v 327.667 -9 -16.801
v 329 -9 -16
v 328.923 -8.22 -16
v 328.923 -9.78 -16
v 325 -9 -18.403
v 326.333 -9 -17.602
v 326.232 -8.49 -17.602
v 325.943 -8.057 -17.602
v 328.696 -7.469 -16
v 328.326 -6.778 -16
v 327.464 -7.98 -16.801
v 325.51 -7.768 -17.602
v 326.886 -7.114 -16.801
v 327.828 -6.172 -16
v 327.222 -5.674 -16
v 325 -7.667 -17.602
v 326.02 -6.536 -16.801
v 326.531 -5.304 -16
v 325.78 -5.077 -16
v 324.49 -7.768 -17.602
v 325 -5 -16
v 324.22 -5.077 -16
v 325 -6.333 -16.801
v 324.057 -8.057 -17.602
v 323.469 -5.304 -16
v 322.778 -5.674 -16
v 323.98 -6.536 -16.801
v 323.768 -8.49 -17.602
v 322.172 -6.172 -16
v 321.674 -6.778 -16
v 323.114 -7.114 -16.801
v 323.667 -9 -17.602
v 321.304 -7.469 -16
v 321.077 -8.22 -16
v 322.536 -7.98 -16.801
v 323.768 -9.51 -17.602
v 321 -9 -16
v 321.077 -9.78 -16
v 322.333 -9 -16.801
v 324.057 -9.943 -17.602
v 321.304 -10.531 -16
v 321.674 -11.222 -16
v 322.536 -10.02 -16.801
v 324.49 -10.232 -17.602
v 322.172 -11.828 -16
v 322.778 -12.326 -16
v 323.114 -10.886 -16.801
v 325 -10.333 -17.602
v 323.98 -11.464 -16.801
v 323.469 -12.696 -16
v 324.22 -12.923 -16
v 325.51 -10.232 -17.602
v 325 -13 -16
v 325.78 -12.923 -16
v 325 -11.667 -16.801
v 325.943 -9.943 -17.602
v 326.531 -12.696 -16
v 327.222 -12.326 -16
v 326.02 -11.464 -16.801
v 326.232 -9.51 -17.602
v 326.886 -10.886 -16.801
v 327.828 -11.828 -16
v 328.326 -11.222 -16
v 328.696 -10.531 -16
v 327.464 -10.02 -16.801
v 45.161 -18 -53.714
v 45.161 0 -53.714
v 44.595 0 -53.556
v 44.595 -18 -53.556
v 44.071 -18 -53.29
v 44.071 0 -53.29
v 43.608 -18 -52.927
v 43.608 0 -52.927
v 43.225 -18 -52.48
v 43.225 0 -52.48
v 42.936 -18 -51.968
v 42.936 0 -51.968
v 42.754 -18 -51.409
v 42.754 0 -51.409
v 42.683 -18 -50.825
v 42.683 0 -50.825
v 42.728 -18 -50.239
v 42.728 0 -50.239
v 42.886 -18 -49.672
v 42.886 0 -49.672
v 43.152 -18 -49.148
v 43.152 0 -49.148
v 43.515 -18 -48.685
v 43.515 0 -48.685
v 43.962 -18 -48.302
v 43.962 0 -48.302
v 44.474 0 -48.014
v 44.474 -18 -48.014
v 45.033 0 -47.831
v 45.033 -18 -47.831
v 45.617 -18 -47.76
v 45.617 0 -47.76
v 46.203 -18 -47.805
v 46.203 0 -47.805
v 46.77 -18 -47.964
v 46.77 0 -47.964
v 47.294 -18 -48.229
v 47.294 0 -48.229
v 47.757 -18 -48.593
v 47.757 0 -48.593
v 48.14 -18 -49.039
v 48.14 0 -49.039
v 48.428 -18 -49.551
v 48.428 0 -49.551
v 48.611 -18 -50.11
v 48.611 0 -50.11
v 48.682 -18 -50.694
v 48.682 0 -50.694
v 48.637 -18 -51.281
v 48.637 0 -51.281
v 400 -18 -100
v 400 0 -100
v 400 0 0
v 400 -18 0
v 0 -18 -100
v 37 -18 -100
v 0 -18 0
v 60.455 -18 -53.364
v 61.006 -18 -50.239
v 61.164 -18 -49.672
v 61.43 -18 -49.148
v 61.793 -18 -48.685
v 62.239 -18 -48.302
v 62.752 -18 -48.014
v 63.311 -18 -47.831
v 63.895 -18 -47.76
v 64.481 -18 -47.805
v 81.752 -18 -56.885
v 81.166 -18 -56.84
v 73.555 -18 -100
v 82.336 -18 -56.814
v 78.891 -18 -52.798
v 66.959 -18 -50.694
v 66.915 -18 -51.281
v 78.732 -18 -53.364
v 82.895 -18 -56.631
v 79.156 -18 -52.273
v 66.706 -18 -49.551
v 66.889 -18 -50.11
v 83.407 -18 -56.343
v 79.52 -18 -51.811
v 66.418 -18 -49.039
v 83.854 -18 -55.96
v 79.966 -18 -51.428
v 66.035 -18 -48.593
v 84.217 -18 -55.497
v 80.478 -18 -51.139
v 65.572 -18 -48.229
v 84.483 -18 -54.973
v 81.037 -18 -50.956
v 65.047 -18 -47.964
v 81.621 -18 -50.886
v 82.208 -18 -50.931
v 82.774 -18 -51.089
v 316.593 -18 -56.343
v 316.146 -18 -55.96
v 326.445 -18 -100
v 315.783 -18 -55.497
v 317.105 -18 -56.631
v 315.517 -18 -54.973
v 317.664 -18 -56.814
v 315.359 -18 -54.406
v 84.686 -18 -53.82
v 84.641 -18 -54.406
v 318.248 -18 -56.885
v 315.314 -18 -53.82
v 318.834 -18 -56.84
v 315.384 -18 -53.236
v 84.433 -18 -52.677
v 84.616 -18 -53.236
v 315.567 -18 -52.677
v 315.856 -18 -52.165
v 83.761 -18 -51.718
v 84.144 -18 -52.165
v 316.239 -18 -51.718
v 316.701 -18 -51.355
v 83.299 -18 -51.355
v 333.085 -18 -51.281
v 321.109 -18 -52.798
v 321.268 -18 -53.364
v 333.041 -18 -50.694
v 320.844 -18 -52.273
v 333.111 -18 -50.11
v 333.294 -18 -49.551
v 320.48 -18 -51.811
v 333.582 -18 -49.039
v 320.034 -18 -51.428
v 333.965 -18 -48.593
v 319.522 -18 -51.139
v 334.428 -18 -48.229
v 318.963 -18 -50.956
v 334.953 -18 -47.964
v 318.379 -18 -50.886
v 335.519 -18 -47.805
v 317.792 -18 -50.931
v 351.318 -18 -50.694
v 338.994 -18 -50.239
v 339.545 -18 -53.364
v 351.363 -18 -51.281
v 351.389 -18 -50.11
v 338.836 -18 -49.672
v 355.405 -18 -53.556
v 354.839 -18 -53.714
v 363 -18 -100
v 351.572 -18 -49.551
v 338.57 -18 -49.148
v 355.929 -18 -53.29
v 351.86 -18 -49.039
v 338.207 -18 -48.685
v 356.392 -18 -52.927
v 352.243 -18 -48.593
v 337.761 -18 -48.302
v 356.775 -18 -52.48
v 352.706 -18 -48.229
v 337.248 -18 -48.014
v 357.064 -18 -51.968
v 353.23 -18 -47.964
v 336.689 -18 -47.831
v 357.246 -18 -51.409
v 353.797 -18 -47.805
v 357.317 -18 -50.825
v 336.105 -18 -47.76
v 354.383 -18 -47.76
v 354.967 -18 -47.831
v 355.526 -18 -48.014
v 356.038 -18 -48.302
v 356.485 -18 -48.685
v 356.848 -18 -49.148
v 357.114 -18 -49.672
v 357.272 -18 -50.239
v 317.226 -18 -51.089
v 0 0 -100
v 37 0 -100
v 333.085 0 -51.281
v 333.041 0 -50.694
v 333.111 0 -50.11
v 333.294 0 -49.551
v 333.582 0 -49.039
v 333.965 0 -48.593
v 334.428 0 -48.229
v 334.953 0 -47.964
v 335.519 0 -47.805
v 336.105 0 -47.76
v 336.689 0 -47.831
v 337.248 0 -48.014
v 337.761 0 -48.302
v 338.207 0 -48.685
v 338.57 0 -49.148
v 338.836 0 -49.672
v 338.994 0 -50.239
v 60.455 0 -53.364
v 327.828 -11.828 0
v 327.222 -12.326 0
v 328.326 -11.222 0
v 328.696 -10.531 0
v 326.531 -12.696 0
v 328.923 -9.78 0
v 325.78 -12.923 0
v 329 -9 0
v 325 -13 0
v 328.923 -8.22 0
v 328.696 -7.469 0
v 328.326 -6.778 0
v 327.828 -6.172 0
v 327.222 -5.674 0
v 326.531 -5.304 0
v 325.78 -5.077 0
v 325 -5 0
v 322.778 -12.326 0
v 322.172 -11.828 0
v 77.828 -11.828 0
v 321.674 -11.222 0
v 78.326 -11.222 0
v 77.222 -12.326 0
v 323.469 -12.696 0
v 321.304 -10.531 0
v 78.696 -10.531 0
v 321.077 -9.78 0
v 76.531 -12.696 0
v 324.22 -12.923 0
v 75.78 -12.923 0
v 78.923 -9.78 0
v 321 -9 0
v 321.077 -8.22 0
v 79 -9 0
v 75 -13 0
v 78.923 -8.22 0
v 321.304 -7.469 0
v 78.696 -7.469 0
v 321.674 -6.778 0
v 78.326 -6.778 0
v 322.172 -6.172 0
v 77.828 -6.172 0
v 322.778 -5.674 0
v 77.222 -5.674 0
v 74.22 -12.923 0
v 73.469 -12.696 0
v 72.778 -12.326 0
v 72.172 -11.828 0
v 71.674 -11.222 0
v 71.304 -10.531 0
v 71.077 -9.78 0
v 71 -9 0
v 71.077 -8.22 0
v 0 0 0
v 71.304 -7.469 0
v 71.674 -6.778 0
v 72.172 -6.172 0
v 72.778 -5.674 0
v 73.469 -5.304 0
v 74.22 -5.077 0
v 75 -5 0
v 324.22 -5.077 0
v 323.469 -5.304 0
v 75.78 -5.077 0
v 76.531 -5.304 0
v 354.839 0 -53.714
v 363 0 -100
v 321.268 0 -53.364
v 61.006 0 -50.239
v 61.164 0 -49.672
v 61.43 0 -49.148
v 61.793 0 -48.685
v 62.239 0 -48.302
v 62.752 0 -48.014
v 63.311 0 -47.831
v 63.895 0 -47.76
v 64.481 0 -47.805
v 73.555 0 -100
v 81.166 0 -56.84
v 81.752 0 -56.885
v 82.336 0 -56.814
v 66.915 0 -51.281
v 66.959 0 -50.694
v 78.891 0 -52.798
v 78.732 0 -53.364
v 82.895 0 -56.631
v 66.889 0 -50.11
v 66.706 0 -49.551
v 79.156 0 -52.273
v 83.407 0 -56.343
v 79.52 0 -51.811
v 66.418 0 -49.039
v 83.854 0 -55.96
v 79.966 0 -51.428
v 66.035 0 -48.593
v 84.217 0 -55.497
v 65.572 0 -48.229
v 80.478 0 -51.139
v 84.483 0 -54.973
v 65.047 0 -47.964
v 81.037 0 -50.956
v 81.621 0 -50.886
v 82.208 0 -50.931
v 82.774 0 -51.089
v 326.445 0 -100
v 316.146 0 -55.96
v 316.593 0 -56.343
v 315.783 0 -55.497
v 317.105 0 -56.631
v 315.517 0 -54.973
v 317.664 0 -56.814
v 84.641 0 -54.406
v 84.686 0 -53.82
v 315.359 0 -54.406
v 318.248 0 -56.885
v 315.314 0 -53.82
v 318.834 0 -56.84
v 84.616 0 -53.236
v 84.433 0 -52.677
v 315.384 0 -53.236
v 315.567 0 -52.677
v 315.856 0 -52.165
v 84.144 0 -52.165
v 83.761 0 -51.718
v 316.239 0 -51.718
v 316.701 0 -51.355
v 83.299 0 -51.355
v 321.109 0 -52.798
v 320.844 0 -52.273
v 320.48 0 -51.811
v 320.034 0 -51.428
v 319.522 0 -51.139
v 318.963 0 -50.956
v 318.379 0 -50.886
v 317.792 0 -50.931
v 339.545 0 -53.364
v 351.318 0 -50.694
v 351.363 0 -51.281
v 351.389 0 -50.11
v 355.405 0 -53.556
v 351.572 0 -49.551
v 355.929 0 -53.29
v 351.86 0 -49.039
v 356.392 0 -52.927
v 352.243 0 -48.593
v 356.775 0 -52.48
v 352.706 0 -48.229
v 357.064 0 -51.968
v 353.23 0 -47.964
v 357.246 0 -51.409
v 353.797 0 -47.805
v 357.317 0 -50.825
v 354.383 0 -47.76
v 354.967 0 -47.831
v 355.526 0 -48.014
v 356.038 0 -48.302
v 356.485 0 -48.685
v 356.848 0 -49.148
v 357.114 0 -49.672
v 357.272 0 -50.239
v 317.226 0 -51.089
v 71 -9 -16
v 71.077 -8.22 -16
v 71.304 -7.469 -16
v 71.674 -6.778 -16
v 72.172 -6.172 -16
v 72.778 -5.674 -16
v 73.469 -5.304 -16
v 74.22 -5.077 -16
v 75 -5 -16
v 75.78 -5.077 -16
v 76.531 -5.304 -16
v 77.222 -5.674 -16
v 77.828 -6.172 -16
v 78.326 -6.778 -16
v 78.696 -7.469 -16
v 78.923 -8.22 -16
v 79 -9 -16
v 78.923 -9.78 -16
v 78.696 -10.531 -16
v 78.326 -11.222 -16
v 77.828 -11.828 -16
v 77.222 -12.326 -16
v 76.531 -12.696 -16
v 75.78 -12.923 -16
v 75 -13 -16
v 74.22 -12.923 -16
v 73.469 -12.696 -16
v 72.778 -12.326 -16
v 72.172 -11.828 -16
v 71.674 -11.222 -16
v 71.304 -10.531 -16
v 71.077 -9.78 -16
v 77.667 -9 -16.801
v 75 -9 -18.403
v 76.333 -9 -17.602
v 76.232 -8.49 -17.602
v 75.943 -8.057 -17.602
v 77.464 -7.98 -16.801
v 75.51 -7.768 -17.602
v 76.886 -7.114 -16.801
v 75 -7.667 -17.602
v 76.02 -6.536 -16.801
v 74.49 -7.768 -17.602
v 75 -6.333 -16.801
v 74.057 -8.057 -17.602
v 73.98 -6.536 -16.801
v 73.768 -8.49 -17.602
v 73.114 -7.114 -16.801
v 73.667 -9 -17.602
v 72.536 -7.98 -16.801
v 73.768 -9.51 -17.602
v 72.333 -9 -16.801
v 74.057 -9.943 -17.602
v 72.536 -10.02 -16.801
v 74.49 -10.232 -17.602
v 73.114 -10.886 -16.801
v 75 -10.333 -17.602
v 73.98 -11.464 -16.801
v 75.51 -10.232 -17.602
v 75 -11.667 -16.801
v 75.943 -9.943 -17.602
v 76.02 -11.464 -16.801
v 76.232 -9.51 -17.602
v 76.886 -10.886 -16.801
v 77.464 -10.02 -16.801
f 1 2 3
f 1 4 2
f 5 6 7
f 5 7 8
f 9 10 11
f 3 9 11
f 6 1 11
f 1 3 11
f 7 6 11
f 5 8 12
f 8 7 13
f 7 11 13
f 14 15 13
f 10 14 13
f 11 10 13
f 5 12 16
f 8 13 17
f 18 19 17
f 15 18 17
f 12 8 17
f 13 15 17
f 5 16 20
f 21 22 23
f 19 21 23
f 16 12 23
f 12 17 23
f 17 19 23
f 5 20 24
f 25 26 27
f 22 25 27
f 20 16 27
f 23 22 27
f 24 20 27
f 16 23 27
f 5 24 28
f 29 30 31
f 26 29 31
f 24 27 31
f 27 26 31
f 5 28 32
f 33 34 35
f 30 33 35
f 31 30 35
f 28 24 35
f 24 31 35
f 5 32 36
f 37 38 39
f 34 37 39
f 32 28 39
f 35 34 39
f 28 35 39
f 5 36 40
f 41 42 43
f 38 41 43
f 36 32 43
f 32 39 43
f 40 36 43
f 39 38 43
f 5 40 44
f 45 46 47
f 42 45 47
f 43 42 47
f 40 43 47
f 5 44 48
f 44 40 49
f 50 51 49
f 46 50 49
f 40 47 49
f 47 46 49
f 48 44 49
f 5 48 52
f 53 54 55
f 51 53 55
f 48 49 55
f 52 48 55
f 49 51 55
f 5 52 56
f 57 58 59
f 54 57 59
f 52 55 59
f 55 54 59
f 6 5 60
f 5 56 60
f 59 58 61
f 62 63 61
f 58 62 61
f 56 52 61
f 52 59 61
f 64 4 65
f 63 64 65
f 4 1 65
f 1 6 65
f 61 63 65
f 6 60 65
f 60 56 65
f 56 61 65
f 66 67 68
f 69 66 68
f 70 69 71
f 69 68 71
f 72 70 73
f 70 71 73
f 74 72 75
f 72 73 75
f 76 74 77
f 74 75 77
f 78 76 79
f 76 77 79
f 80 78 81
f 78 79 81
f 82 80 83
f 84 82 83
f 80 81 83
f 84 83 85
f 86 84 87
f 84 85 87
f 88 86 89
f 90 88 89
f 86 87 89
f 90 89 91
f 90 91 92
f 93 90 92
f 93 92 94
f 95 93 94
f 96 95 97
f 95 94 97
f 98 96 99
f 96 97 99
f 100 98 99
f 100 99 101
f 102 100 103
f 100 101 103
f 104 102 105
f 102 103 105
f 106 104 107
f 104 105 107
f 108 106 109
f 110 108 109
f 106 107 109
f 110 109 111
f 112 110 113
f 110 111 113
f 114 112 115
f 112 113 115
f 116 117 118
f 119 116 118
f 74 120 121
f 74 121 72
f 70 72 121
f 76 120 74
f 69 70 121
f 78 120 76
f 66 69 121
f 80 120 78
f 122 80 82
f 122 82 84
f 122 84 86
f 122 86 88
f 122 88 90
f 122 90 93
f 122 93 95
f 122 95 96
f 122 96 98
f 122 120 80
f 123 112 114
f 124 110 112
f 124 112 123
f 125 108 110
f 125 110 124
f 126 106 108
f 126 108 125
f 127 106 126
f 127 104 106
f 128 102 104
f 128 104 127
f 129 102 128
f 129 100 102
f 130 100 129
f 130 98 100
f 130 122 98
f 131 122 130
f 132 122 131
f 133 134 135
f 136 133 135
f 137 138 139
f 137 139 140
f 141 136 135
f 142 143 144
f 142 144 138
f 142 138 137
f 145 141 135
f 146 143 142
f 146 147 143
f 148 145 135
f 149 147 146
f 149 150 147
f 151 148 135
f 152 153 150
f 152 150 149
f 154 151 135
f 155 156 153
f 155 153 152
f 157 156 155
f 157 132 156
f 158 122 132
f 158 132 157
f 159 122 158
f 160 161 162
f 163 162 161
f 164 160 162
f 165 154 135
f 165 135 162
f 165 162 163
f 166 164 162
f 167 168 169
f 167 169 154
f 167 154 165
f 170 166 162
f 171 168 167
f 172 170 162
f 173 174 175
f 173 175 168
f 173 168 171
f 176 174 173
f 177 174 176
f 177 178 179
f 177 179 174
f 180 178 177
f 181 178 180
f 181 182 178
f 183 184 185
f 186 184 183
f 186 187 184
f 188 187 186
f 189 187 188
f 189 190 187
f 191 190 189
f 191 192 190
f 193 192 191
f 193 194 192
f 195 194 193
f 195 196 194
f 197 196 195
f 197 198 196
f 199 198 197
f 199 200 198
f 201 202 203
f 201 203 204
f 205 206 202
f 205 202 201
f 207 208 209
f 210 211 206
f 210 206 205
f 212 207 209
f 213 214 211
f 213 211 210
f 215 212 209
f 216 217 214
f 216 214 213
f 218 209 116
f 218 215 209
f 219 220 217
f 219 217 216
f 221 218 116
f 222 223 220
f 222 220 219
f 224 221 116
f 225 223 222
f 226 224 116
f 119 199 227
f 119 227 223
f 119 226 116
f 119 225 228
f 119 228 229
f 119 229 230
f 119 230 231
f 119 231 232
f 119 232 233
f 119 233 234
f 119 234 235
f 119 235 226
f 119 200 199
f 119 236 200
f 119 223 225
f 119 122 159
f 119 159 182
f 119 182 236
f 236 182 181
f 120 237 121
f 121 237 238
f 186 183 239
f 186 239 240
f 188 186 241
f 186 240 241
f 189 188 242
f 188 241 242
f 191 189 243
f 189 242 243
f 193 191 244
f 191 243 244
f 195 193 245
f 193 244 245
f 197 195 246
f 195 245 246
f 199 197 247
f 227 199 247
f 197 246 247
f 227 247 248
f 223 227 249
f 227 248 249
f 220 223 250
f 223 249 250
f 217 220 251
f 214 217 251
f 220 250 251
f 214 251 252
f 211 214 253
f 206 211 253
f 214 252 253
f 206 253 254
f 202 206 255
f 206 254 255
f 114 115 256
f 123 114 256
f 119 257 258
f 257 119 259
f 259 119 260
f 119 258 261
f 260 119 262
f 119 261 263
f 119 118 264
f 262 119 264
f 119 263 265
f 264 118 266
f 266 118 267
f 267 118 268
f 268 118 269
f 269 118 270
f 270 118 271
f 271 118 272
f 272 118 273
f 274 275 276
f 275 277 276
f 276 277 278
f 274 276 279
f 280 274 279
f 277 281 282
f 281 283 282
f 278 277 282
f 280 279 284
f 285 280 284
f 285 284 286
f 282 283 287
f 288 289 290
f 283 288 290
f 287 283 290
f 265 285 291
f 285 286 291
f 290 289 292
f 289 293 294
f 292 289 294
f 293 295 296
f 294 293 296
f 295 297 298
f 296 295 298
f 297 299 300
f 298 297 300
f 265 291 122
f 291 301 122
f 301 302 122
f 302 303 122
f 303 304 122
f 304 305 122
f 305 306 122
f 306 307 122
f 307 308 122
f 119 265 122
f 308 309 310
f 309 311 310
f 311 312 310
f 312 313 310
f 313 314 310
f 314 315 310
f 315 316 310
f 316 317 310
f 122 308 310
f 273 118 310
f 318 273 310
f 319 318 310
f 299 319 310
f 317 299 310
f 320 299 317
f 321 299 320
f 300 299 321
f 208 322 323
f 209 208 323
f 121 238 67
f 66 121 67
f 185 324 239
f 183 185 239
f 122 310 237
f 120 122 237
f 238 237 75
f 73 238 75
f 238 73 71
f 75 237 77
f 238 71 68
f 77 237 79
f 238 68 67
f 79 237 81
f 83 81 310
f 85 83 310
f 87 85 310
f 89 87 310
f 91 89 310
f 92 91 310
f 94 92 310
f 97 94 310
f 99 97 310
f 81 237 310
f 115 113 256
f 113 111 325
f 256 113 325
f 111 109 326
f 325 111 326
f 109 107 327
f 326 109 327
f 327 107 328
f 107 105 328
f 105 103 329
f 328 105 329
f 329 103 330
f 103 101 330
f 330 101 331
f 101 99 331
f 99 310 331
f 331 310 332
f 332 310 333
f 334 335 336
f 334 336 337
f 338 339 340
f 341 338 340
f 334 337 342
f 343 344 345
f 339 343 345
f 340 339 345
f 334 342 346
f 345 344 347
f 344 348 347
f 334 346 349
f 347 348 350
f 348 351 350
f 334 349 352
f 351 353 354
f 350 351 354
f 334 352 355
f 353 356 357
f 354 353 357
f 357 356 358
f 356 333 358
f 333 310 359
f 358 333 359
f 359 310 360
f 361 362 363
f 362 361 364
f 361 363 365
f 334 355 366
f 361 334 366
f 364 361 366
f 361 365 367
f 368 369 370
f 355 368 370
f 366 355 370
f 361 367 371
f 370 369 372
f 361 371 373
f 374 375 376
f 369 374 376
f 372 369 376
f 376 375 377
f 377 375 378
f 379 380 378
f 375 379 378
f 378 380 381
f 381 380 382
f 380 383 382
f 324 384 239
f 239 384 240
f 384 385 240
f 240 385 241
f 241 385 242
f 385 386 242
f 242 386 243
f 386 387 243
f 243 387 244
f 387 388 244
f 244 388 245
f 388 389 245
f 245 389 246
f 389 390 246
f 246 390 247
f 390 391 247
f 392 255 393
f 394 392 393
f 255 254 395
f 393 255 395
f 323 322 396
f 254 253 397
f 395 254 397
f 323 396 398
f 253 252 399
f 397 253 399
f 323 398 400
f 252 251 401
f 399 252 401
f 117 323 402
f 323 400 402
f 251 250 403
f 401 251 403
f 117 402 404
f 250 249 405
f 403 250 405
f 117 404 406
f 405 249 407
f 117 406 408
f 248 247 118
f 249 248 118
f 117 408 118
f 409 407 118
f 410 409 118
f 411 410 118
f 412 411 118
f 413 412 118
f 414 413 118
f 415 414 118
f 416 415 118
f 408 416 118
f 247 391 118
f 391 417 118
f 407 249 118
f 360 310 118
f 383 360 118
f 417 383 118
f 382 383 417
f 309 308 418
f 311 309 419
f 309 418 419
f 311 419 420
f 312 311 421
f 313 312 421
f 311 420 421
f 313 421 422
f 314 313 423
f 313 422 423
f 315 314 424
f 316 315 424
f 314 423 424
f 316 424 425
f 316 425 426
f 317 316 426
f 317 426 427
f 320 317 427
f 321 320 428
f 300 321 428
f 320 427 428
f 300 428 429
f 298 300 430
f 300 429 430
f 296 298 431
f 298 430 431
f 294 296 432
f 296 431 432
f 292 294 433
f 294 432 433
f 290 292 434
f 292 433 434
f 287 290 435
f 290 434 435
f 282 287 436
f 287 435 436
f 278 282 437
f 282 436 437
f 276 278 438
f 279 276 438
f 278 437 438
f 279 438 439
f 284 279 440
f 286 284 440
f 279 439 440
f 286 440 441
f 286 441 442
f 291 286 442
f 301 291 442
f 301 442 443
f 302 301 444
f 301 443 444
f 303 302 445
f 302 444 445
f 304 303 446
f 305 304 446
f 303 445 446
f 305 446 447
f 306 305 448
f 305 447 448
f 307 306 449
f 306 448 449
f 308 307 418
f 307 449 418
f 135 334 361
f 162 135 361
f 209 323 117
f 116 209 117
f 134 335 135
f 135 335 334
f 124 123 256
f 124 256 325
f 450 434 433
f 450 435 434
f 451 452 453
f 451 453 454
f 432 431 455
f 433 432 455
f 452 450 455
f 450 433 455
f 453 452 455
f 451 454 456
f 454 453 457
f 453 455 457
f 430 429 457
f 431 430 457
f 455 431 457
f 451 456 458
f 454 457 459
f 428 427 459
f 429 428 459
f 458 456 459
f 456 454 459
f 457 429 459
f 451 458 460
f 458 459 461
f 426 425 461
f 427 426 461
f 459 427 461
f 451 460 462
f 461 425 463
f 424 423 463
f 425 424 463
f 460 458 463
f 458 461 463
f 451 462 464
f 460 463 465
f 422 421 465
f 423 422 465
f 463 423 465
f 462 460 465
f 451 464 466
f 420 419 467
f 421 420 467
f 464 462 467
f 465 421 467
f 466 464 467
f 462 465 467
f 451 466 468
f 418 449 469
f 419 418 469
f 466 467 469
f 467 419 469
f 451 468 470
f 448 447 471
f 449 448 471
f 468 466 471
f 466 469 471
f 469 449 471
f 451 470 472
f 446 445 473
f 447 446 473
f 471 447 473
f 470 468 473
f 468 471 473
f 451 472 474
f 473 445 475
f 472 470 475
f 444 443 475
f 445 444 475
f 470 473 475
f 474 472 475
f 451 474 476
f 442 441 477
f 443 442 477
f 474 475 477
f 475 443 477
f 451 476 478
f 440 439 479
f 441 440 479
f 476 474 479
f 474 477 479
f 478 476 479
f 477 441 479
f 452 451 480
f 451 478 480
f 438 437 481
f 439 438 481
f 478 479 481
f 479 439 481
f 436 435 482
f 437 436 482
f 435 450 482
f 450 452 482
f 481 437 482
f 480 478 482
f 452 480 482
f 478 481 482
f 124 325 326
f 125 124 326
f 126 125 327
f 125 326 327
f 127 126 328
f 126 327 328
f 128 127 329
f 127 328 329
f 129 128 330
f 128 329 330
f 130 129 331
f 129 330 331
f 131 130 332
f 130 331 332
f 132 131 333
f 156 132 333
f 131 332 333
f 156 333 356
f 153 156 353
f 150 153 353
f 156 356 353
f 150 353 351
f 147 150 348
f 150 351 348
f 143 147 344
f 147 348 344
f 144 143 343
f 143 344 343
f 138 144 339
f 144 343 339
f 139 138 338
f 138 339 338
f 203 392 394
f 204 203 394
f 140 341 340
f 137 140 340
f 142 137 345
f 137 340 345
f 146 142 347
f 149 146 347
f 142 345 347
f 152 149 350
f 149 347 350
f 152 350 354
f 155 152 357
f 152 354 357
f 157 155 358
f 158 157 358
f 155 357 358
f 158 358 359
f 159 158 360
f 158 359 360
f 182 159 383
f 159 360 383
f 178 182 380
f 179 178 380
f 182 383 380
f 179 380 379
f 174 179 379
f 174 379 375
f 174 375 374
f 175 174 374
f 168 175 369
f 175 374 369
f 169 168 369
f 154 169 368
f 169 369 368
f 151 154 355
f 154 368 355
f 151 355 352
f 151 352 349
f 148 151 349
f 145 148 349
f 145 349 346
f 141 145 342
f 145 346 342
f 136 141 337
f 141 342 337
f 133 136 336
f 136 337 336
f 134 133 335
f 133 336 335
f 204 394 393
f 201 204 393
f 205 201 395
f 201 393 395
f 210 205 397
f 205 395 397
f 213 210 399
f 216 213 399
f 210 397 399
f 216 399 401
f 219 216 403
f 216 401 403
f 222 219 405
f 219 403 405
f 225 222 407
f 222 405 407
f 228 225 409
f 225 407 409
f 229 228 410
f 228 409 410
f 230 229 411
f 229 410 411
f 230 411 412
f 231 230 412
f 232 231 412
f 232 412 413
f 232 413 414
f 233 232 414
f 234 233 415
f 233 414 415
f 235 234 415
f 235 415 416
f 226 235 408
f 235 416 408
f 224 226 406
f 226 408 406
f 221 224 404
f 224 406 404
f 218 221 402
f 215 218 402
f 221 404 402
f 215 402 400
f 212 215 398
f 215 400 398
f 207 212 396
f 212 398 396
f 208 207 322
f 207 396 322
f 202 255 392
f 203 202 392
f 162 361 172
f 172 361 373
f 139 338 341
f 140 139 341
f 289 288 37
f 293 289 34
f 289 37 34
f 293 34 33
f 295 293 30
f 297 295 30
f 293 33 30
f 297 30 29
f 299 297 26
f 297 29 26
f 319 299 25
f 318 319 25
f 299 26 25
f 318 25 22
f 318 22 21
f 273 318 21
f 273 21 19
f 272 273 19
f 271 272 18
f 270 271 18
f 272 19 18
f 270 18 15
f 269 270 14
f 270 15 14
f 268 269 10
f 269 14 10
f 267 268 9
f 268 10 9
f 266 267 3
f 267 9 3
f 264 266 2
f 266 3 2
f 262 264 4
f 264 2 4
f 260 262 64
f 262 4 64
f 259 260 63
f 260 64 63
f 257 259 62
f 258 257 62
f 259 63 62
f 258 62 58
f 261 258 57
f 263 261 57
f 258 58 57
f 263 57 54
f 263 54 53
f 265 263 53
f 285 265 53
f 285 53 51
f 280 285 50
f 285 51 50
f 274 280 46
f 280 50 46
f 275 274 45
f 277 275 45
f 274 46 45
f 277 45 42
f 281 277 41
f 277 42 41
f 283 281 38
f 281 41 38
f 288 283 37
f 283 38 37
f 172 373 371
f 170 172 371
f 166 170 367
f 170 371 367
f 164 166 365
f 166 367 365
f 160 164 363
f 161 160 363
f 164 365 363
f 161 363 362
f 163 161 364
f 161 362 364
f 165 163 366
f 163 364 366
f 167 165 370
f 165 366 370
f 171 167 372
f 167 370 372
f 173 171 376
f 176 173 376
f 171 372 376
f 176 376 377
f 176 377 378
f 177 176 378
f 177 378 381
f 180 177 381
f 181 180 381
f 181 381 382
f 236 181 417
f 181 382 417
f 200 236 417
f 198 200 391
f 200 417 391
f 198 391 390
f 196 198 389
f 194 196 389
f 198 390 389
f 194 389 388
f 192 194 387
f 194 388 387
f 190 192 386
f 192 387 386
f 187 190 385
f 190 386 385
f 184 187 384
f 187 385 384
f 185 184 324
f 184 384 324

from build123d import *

# Parameters (mm, degrees)
F1_DEPTH = 18
F3_D     = 8
F3_DEPTH = 16
F3_TIP   = 2.4034424761


with BuildPart() as f1:
    # F0 (on Front) → F1 (new body)
    with BuildSketch(Plane.XZ):
        with BuildLine():
            Line((400, 0), (0, 0))
            Line((0, 0), (0, -100))
            Line((0, -100), (37, -100))
            Line((37, -100), (45.1614643503, -53.7140356084))
            ThreePointArc((45.1614643503, -53.7140356084), (43.9616795743, -48.3021562165), (48.6368321424, -51.2805568824))
            Line((48.6368321424, -51.2805568824), (60.4545251785, -53.3643350144))
            Line((60.4545251785, -53.3643350144), (61.0056646383, -50.2386678164))
            ThreePointArc((61.0056646383, -50.2386678164), (64.4810324303, -47.8051890904), (66.9145111563, -51.2805568824))
            Line((66.9145111563, -51.2805568824), (78.7322041925, -53.3643350144))
            ThreePointArc((78.7322041925, -53.3643350144), (84.1440835844, -52.1645502383), (81.1656829185, -56.8397028064))
            Line((81.1656829185, -56.8397028064), (73.5553580279, -100))
            Line((73.5553580279, -100), (326.4446419721, -100))
            Line((326.4446419721, -100), (318.8343170815, -56.8397028064))
            ThreePointArc((318.8343170815, -56.8397028064), (315.8559164156, -52.1645502383), (321.2677958075, -53.3643350144))
            Line((321.2677958075, -53.3643350144), (333.0854888437, -51.2805568824))
            ThreePointArc((333.0854888437, -51.2805568824), (335.5189675697, -47.8051890904), (338.9943353617, -50.2386678164))
            Line((338.9943353617, -50.2386678164), (339.5454748215, -53.3643350144))
            Line((339.5454748215, -53.3643350144), (351.3631678576, -51.2805568824))
            ThreePointArc((351.3631678576, -51.2805568824), (356.0383204257, -48.3021562165), (354.8385356497, -53.7140356084))
            Line((354.8385356497, -53.7140356084), (363, -100))
            Line((363, -100), (400, -100))
            Line((400, -100), (400, 0))
        make_face()
    extrude(amount=F1_DEPTH)

    # F3
    with Locations(Plane.XY):
        with Locations((75, -9), (325, -9)):
            Hole(F3_D / 2, depth=F3_DEPTH)
            with Locations((0, 0, -(F3_DEPTH + F3_TIP / 2))):  # 118° drill point
                Cone(0, F3_D / 2, F3_TIP, mode=Mode.SUBTRACT)


solid = f1.part
